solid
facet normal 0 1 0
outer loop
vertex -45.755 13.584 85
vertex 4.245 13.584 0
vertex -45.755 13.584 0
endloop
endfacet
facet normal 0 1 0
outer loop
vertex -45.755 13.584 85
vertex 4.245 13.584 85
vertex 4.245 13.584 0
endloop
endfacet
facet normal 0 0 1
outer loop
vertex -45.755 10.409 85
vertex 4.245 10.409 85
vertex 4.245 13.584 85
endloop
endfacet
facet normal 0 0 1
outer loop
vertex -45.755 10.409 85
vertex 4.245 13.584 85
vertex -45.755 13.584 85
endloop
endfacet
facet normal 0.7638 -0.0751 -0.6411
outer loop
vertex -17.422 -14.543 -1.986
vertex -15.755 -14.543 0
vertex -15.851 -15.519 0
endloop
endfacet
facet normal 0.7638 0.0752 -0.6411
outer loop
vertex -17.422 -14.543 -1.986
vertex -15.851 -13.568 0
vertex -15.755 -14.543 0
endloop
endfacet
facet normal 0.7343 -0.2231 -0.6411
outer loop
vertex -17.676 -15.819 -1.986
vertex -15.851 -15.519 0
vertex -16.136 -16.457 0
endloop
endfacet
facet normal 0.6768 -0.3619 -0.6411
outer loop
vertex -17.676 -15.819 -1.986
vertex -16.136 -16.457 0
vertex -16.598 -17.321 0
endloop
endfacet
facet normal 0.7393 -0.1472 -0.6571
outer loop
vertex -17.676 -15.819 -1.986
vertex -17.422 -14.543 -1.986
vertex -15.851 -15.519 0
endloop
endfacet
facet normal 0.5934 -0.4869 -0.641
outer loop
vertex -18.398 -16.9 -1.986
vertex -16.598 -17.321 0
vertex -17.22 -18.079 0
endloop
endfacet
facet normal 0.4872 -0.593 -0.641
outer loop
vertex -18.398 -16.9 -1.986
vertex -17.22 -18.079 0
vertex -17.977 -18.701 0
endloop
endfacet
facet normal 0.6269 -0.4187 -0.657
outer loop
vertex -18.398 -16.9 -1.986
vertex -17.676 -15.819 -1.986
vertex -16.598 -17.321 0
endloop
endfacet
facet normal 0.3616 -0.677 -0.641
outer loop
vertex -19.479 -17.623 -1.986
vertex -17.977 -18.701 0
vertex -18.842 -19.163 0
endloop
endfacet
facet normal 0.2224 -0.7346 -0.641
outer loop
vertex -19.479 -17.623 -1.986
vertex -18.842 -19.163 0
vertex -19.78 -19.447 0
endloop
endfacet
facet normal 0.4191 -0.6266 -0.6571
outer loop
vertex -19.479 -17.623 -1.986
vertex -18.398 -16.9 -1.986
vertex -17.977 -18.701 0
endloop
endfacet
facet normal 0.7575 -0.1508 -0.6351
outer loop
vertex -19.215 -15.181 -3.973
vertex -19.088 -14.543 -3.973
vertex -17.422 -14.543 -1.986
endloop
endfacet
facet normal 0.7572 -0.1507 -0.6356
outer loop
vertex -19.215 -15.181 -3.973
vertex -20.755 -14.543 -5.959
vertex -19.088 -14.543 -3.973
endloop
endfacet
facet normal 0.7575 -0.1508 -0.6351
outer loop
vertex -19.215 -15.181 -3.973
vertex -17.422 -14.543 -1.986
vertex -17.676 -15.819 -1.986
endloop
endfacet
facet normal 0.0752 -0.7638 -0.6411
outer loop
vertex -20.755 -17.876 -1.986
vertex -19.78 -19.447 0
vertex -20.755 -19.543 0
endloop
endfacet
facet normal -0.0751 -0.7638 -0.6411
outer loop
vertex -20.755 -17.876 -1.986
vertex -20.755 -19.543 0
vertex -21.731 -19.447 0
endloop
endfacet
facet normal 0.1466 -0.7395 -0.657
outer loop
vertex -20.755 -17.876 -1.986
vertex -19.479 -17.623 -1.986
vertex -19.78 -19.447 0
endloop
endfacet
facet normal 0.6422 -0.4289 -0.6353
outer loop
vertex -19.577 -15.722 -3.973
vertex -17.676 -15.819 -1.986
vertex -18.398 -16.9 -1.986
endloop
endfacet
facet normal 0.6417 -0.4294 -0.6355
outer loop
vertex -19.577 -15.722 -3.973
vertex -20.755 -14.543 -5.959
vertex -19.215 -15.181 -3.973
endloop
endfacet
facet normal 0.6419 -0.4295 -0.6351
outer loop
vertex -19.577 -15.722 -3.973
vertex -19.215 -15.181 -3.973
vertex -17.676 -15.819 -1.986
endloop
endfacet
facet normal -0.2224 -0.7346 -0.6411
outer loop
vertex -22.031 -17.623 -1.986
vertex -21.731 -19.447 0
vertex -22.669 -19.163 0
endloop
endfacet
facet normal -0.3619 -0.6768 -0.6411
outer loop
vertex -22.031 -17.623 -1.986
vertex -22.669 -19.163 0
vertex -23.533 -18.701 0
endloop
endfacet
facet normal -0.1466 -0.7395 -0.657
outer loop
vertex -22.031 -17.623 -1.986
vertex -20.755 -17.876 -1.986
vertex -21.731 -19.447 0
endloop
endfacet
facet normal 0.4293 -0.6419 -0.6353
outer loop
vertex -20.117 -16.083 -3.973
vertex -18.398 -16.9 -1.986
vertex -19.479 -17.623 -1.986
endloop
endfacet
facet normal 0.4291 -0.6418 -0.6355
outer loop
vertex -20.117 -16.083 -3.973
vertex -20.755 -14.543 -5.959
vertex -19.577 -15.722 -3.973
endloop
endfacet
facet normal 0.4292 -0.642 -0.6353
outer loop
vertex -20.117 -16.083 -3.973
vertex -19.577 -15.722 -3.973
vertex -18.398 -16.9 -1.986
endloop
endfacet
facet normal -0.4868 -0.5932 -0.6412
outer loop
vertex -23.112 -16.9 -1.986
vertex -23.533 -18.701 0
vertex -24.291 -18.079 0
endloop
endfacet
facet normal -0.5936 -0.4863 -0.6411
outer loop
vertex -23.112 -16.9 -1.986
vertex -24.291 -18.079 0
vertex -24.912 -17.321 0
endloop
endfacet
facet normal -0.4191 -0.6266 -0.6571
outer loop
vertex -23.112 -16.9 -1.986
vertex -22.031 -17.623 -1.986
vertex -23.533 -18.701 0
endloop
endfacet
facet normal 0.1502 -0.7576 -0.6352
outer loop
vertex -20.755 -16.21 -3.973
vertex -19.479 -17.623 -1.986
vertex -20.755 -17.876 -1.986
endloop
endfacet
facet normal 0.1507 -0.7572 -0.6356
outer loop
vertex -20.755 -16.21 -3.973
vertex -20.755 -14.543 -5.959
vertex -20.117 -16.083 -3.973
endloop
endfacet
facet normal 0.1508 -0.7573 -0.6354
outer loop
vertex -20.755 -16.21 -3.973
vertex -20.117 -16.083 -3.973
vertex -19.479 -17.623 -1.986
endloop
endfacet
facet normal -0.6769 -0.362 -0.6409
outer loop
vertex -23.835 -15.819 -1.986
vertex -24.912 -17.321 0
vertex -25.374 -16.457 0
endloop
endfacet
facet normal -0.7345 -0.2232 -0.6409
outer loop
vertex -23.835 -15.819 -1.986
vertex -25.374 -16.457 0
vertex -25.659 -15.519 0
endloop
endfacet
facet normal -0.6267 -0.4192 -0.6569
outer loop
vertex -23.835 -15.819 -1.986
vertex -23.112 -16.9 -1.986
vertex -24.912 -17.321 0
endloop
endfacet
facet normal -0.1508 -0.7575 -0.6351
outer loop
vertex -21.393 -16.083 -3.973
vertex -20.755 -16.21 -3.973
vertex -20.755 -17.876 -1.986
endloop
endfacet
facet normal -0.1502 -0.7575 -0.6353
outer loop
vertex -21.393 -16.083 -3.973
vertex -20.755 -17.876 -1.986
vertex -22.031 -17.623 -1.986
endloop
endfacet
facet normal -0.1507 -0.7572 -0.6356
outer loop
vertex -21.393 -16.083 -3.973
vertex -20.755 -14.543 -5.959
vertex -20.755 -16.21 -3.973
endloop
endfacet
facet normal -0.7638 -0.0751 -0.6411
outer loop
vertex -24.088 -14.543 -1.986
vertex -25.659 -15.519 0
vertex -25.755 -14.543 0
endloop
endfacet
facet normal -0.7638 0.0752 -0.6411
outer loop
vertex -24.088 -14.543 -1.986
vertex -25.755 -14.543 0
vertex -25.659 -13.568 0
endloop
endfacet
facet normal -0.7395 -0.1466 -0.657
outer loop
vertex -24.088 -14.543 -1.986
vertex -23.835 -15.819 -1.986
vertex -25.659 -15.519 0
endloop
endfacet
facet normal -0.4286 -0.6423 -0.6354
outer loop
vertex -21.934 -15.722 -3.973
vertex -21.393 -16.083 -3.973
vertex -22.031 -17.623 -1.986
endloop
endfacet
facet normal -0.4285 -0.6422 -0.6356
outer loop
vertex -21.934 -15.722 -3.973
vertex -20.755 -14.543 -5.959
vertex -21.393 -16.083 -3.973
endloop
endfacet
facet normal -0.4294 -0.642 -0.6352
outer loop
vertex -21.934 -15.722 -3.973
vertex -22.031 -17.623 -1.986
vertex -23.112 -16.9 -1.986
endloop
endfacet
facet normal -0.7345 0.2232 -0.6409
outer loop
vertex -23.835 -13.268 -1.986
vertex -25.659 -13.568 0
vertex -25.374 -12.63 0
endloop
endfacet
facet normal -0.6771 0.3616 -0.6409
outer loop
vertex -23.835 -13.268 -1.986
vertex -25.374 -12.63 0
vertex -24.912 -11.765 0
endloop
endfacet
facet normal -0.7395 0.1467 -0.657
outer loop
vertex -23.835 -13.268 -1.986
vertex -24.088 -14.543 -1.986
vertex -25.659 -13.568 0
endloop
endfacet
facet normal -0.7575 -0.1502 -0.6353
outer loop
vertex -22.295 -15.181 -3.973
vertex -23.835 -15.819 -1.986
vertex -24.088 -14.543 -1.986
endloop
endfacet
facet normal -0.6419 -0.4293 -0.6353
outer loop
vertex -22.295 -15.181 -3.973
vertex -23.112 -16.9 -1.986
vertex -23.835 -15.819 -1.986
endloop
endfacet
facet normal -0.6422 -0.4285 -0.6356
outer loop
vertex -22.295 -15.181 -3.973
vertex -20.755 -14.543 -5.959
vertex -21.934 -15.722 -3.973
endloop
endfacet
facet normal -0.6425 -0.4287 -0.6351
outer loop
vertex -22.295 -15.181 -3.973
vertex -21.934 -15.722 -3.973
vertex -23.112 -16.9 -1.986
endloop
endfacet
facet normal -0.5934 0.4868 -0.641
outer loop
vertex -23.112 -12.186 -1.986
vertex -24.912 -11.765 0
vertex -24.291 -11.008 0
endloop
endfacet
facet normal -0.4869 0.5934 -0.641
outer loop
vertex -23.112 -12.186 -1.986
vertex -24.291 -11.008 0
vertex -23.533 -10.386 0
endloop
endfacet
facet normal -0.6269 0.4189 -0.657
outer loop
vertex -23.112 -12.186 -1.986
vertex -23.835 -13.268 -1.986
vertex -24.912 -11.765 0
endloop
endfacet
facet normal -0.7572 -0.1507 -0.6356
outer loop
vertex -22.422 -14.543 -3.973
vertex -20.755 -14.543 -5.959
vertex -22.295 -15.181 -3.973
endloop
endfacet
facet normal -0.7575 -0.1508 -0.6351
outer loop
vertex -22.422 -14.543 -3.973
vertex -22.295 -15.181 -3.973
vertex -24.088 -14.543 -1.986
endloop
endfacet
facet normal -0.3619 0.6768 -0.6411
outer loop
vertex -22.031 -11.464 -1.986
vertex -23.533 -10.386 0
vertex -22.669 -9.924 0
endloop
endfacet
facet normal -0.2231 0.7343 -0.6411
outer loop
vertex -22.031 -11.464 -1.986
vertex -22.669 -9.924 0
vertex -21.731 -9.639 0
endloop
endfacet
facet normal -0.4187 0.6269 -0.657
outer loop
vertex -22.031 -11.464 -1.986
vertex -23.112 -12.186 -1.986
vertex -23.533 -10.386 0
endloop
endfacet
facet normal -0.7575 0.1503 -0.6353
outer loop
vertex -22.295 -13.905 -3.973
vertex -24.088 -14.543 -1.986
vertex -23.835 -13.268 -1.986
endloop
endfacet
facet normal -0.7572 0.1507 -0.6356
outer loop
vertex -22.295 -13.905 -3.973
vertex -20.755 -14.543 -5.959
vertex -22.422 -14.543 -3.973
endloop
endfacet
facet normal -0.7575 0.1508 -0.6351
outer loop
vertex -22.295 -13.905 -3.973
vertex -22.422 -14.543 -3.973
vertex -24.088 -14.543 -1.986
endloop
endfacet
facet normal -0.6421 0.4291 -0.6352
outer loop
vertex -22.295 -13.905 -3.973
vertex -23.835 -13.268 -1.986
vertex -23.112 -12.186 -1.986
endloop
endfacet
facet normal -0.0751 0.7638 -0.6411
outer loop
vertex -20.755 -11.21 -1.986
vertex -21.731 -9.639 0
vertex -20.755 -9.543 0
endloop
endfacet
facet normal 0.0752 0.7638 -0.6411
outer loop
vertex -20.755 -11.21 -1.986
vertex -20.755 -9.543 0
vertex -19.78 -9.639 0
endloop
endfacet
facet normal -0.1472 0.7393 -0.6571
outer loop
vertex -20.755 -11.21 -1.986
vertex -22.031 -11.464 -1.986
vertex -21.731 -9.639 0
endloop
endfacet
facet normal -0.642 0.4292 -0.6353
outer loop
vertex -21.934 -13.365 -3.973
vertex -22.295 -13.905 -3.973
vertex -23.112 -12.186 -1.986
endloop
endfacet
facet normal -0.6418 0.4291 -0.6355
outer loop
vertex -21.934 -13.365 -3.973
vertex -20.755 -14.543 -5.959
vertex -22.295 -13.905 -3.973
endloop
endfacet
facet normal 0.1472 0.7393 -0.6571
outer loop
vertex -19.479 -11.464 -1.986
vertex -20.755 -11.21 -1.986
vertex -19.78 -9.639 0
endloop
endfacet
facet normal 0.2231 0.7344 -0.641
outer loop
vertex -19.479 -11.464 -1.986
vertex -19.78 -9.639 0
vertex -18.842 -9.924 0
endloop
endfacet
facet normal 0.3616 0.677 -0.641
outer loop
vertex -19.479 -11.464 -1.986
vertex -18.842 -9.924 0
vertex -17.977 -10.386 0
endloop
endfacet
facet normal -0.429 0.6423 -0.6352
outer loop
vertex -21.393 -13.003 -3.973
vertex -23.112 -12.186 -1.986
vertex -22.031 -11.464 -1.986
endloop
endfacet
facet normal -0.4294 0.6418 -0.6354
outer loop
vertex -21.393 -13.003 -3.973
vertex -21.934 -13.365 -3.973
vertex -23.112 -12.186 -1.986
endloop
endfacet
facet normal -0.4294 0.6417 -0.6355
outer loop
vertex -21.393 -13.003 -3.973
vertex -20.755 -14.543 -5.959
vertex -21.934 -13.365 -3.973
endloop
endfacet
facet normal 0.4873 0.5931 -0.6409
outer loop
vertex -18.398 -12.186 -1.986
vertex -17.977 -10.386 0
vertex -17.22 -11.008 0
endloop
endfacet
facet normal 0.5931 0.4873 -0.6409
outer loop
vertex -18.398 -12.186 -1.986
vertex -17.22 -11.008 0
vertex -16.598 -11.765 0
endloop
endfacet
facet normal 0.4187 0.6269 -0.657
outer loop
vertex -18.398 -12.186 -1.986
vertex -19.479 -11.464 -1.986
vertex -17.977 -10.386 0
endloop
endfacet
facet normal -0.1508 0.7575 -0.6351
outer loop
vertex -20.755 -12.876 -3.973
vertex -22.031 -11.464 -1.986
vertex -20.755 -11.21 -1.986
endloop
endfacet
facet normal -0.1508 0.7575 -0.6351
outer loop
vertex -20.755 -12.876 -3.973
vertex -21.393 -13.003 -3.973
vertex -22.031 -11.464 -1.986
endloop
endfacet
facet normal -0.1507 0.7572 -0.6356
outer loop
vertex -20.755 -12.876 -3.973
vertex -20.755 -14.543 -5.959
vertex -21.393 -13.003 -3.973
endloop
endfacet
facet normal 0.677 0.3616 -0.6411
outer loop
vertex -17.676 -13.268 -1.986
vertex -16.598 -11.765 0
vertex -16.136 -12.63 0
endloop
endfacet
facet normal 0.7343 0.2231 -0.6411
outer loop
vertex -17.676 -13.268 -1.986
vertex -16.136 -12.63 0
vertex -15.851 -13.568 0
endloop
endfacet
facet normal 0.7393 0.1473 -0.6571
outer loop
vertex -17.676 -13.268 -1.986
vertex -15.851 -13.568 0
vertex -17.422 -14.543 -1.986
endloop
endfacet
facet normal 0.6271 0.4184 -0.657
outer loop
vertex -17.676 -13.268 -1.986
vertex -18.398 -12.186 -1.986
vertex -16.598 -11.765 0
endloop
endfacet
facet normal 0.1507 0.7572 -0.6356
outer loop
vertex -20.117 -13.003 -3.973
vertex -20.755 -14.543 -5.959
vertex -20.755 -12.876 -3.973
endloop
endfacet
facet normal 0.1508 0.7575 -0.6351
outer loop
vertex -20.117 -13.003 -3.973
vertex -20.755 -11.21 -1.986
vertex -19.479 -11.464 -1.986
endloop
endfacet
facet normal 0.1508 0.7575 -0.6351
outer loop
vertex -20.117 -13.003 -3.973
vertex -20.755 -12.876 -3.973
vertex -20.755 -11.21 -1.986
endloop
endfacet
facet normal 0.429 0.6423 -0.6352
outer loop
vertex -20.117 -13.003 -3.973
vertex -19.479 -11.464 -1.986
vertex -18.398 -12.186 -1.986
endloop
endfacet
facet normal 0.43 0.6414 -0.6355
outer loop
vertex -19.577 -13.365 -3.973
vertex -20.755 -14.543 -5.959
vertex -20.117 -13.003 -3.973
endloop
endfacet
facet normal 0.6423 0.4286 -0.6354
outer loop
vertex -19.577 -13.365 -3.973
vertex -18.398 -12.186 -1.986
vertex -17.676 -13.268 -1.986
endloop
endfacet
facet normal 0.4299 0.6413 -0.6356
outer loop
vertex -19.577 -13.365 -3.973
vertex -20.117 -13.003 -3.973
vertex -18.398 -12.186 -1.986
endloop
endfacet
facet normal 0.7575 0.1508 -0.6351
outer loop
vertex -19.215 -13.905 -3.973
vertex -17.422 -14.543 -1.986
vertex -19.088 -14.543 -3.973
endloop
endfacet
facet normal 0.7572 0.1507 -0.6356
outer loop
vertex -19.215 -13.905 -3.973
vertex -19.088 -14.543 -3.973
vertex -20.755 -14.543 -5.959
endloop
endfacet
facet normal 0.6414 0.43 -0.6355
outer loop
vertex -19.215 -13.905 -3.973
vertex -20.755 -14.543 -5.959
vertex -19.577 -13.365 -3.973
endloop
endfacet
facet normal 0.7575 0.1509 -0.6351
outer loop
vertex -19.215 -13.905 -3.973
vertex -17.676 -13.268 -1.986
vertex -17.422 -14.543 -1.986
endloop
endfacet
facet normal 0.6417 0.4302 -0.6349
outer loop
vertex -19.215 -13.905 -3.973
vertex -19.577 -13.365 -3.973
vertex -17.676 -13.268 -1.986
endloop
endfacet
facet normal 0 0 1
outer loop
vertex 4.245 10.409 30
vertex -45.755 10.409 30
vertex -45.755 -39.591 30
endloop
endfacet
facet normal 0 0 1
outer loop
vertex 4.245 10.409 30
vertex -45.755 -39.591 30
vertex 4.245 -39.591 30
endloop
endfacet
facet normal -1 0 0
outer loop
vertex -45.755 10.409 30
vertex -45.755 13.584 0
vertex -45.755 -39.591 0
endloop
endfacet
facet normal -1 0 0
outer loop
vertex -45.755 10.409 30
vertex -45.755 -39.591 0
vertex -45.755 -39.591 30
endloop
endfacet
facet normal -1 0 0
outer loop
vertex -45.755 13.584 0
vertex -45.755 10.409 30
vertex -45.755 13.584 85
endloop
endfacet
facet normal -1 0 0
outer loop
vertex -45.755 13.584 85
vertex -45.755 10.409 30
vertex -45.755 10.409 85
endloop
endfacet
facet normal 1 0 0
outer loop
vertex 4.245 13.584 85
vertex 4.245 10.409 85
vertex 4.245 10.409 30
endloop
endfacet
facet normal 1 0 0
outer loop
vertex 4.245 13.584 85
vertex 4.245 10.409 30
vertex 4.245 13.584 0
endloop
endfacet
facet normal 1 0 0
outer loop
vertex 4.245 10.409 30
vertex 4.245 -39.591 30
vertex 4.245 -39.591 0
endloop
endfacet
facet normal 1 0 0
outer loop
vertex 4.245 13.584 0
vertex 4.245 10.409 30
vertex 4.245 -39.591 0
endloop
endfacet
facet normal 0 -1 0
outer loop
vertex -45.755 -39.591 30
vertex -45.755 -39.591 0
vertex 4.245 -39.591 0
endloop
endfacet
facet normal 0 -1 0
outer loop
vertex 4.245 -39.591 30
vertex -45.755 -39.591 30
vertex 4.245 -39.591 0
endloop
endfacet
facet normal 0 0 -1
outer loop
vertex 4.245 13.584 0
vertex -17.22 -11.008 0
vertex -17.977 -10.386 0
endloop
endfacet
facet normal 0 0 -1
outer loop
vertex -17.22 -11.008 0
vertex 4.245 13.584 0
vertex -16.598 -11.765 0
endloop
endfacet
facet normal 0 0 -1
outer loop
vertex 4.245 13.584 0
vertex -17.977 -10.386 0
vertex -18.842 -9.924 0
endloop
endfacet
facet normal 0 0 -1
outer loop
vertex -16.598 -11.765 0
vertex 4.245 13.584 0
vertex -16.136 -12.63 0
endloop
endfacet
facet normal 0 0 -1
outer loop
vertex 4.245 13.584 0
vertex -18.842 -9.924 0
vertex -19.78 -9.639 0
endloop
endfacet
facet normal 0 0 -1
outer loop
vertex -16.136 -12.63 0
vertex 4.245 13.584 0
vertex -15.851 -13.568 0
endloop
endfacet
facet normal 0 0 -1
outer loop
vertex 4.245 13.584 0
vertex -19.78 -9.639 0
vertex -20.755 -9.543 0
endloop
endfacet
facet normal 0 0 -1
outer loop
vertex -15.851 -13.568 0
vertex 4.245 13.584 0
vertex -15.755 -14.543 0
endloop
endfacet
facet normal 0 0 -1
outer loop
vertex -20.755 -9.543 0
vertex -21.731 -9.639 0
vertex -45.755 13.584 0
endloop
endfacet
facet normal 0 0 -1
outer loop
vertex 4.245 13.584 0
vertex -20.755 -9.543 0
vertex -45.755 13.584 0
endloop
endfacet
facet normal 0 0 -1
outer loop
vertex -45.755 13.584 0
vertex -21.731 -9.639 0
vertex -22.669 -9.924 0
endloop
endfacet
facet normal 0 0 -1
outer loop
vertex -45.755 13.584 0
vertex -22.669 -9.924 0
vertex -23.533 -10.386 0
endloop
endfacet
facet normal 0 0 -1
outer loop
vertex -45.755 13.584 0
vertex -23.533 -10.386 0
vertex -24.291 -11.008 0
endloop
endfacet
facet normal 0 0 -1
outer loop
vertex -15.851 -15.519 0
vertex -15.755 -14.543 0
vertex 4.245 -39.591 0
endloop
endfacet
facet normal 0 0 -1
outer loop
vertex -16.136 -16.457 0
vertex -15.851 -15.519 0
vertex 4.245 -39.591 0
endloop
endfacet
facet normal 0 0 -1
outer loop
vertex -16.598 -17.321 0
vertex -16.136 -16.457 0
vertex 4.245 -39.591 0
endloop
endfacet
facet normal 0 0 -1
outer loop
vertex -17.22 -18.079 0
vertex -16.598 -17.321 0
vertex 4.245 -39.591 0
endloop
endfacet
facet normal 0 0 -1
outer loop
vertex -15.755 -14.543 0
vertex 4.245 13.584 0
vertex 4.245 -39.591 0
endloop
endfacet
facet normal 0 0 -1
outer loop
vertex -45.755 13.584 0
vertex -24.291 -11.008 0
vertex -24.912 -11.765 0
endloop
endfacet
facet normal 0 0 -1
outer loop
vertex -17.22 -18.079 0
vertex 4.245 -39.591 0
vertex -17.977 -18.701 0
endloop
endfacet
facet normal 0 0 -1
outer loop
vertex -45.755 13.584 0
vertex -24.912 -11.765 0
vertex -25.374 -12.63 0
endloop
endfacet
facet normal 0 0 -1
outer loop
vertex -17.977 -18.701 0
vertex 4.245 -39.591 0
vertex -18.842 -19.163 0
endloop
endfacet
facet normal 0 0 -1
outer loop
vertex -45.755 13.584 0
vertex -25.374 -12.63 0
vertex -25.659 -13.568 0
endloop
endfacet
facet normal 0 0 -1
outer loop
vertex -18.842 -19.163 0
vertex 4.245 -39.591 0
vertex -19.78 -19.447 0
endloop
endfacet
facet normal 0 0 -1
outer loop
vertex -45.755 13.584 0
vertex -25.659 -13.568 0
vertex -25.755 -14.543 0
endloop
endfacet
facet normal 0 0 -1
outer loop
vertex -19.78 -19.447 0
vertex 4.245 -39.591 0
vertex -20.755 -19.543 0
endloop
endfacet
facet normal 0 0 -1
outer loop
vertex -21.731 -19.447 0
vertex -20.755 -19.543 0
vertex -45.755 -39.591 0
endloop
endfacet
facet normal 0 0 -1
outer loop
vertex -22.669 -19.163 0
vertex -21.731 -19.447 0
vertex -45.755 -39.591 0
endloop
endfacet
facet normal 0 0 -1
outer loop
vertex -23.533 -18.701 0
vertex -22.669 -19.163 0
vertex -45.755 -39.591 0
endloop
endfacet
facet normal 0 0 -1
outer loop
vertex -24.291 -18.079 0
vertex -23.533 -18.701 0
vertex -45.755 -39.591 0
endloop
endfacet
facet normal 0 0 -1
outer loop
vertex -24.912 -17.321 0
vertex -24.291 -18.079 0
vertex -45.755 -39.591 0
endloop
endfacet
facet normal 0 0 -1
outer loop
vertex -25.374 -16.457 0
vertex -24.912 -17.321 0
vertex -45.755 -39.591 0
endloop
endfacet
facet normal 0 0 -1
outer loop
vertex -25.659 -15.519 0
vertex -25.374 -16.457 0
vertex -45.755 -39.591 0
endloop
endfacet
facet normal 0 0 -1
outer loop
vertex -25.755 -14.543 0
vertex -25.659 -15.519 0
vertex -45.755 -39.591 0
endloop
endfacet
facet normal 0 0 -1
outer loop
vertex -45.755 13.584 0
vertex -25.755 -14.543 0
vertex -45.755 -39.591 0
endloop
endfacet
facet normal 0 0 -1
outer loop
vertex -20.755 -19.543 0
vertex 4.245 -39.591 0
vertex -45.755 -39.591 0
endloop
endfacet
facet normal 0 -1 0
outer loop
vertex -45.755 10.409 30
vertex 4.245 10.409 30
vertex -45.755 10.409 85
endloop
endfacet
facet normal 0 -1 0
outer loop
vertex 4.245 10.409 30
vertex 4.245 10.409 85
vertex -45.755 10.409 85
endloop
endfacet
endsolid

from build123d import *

# Parameters (mm, degrees)
F0_W     = 50
F0_H     = 50
F1_DEPTH = 30
F2_W     = 50
F2_H     = 30
F2_H_2   = 55
F3_DEPTH = 3.175
F4_R     = 5


# Not quite as in the source:
# - an extrude whose draft closes it to a point is written as a loft to that point


with BuildPart() as f1:
    # F0 (on Top) → F1 (new body)
    with BuildSketch(Plane.XY):
        with Locations((-20.7551017412, -14.590555802)):
            Rectangle(F0_W, F0_H)
    extrude(amount=F1_DEPTH)

    # F2 (on face) → F3 (join)
    with BuildSketch(Plane(origin=(0, 10.409444198, 0), x_dir=(-1, 0, 0), z_dir=(0, 1, 0))):
        with Locations((20.7551017412, 15)):
            Rectangle(F2_W, F2_H)
        with Locations((20.7551017412, 57.5)):
            Rectangle(F2_W, F2_H_2)
    extrude(amount=F3_DEPTH)

    # F4 (on face) → F5 section 0
    with BuildSketch(Plane(origin=(0, 0, 0), x_dir=(1, 0, 0), z_dir=(0, 0, -1)), mode=Mode.PRIVATE) as f5_s0:
        with Locations((-20.7551017412, 14.5431621725)):
            Circle(F4_R)
    loft([f5_s0.sketch, Vertex(-20.7551017412, -14.5431621725, -5.958767963)], ruled=True)


solid = f1.part
